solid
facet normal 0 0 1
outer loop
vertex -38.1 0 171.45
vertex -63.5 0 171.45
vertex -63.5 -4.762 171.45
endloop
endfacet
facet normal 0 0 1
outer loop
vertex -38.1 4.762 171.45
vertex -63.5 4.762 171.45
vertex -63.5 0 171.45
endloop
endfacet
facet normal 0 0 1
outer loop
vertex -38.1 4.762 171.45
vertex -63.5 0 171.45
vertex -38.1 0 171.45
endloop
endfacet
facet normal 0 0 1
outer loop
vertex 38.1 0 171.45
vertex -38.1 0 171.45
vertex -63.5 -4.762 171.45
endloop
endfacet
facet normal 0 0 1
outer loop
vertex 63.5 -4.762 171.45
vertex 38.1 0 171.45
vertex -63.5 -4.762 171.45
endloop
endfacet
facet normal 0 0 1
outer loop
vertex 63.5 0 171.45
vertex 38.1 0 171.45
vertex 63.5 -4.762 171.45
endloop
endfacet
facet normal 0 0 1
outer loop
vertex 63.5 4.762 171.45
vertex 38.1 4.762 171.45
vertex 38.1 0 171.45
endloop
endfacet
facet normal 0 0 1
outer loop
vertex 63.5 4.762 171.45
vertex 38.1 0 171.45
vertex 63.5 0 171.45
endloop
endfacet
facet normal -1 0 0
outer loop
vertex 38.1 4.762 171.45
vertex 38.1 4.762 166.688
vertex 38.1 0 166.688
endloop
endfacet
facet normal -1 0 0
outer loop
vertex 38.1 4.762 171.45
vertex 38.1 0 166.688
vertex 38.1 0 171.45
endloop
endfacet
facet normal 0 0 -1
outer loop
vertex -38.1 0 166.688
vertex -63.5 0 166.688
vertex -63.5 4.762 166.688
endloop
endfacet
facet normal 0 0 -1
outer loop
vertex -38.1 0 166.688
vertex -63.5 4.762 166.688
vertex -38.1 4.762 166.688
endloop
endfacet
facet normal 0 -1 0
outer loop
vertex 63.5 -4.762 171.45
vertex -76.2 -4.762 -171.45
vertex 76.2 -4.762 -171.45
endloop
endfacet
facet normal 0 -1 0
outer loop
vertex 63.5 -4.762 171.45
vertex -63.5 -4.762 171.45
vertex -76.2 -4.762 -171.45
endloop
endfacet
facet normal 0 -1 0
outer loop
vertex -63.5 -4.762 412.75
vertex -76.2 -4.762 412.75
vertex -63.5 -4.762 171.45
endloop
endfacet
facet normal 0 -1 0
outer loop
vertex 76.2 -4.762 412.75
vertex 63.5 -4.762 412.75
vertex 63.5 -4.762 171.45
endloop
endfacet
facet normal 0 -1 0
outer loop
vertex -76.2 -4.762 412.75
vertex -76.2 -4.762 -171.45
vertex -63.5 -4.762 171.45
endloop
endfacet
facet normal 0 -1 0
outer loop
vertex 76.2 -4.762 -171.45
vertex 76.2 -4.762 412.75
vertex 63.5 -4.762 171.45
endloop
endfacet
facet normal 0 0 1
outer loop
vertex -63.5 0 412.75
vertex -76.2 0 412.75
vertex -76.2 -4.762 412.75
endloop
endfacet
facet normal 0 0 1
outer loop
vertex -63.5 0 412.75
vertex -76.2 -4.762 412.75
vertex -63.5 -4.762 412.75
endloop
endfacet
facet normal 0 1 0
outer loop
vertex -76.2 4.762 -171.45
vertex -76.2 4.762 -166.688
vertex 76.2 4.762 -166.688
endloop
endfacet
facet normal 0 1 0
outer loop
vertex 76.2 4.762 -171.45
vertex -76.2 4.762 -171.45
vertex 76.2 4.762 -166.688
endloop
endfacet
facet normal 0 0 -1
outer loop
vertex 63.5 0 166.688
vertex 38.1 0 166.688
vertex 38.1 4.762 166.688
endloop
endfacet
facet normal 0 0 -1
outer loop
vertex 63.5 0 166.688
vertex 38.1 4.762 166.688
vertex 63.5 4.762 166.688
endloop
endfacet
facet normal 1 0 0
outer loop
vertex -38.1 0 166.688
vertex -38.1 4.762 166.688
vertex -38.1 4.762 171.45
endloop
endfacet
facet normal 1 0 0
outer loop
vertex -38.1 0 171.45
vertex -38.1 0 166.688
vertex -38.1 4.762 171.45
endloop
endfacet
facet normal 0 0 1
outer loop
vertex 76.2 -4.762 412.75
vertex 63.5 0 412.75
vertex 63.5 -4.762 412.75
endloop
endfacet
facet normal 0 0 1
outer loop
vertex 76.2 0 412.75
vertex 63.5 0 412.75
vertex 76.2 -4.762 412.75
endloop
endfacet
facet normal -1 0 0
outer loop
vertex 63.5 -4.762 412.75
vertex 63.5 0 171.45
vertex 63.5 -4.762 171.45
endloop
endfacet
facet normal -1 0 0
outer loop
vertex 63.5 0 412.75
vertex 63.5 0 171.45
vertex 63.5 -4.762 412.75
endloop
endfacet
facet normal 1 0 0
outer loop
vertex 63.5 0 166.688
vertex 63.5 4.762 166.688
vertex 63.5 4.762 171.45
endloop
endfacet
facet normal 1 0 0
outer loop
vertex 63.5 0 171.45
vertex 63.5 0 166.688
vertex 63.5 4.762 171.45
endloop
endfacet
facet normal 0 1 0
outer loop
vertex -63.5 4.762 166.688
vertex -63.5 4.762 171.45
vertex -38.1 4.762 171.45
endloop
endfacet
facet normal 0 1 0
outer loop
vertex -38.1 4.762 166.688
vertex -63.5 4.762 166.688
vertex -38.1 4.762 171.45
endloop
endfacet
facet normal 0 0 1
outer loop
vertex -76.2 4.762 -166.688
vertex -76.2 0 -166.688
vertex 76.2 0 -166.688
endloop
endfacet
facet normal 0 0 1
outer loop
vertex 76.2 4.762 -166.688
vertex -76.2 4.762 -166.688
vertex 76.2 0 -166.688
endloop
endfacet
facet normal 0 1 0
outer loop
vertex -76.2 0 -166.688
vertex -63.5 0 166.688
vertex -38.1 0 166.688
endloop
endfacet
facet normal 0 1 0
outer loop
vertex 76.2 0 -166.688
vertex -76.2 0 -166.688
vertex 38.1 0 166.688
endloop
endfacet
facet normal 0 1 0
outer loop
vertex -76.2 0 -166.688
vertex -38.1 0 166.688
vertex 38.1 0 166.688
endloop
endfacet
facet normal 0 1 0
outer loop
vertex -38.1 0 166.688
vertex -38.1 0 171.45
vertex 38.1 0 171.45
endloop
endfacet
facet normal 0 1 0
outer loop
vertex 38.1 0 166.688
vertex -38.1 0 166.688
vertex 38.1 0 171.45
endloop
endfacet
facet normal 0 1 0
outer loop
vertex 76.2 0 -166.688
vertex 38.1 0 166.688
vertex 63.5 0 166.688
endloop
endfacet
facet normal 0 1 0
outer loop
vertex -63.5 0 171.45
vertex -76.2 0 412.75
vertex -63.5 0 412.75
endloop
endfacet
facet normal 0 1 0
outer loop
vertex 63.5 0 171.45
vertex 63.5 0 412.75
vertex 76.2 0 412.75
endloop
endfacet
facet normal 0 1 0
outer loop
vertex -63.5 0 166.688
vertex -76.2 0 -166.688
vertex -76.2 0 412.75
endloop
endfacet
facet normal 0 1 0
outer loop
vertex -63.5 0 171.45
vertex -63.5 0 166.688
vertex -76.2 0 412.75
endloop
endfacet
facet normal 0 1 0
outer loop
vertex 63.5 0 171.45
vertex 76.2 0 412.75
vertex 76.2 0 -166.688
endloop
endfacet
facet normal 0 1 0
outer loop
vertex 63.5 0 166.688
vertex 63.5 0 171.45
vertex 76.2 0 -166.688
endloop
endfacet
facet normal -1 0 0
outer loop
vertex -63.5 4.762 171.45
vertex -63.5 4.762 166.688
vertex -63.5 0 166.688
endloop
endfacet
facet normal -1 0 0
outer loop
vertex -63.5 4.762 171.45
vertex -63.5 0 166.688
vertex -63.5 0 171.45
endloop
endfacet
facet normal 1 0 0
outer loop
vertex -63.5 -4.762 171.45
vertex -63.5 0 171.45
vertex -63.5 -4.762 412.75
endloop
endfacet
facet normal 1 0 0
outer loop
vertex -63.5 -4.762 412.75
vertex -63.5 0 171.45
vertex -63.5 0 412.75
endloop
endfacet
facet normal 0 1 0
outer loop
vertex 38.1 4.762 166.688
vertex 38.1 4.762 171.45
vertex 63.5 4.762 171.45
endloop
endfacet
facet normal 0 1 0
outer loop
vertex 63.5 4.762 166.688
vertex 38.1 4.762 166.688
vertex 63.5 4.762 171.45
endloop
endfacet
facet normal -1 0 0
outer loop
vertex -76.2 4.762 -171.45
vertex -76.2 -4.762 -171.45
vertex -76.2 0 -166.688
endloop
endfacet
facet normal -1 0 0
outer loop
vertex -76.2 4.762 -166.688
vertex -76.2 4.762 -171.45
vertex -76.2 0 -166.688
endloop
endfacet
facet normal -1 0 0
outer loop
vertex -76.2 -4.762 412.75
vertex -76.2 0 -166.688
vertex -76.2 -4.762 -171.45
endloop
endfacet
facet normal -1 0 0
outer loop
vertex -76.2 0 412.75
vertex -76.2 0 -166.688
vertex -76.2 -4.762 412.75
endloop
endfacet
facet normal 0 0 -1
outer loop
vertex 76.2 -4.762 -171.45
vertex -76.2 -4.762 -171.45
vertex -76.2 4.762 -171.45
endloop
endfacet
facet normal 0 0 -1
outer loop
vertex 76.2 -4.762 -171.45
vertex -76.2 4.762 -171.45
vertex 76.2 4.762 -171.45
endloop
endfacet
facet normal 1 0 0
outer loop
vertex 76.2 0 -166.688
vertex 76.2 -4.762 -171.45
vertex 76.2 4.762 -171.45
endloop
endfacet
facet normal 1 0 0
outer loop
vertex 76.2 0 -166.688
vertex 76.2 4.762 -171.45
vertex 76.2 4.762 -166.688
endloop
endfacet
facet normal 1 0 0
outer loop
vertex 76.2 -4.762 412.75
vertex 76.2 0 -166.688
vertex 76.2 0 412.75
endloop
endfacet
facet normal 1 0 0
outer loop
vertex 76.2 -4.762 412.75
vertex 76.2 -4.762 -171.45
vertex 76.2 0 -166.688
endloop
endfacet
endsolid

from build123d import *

# Parameters (mm, degrees)
F0_W     = 152.4
F0_H     = 342.9
F1_DEPTH = 4.7625
F2_W     = 25.4
F2_H     = 4.7625
F3_DEPTH = 9.525
F4_W     = 152.4
F4_H     = 4.7625
F5_DEPTH = 9.525
F6_W     = 12.7
F6_H     = 241.3
F7_DEPTH = 4.7625


with BuildPart() as f1:
    # F0 (on Front) → F1 (new body)
    with BuildSketch(Plane.XZ):
        Rectangle(F0_W, F0_H)
    extrude(amount=F1_DEPTH)

    # F2 (on face) → F3 (join)
    with BuildSketch(Plane.XZ.offset(4.7625)):
        with Locations((-50.8, 169.06875)):
            Rectangle(F2_W, F2_H)
        with Locations((50.8, 169.06875)):
            Rectangle(F2_W, F2_H)
    extrude(amount=-F3_DEPTH)

    # F4 (on face) → F5 (join)
    with BuildSketch(Plane.XZ.offset(4.7625)):
        with Locations((0, -169.06875)):
            Rectangle(F4_W, F4_H)
    extrude(amount=-F5_DEPTH)

    # F6 (on Front) → F7 (join)
    with BuildSketch(Plane.XZ):
        with Locations((-69.85, 292.1)):
            Rectangle(F6_W, F6_H)
        with Locations((69.85, 292.1)):
            Rectangle(F6_W, F6_H)
    extrude(amount=F7_DEPTH)


solid = f1.part
